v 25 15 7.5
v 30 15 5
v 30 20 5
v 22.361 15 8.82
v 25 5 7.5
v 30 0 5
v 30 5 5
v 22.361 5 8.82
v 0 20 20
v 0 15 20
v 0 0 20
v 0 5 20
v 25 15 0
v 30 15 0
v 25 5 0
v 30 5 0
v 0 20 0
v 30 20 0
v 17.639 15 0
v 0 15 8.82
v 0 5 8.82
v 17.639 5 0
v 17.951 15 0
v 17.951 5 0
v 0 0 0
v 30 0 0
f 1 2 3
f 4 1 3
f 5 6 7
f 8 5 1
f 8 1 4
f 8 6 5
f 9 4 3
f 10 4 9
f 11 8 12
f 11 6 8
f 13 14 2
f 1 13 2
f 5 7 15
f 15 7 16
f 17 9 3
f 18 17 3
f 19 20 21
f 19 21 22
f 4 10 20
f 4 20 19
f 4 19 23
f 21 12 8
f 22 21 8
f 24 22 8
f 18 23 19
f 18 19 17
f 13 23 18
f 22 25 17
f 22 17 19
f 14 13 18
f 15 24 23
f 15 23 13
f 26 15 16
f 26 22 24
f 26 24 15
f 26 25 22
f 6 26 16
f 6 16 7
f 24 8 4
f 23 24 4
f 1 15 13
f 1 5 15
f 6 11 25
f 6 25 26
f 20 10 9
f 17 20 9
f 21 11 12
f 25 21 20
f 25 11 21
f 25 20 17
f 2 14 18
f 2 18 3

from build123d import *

# Parameters (mm, degrees)
F1_DEPTH = 20
F2_W     = 25
F2_H     = 10
F3_DEPTH = 10
F4_W     = 10
F4_H     = 5
F4_H_2   = 2.5
F5_DEPTH = 5


with BuildPart() as f1:
    # F0 (on Front) → F1 (new body)
    with BuildSketch(Plane.XZ):
        Polygon((30, 5), (0, 20), (0, 0), (30, 0), align=None)
    extrude(amount=-F1_DEPTH)

    # F2 (on face) → F3 (cut)
    with BuildSketch(Plane(origin=(8, 0, 16), x_dir=(0.894427191, 0, -0.4472135955), z_dir=(0.4472135955, 0, 0.894427191))):
        with Locations((3.55572809, 10)):
            Rectangle(F2_W, F2_H)
    extrude(amount=-F3_DEPTH, mode=Mode.SUBTRACT)

    # F4 (on face) → F5 (cut)
    with BuildSketch(Plane.YZ.offset(30)):
        with Locations((10, 2.5)):
            Rectangle(F4_W, F4_H)
        with Locations((10, 6.25)):
            Rectangle(F4_W, F4_H_2)
    extrude(amount=-F5_DEPTH, mode=Mode.SUBTRACT)


solid = f1.part
